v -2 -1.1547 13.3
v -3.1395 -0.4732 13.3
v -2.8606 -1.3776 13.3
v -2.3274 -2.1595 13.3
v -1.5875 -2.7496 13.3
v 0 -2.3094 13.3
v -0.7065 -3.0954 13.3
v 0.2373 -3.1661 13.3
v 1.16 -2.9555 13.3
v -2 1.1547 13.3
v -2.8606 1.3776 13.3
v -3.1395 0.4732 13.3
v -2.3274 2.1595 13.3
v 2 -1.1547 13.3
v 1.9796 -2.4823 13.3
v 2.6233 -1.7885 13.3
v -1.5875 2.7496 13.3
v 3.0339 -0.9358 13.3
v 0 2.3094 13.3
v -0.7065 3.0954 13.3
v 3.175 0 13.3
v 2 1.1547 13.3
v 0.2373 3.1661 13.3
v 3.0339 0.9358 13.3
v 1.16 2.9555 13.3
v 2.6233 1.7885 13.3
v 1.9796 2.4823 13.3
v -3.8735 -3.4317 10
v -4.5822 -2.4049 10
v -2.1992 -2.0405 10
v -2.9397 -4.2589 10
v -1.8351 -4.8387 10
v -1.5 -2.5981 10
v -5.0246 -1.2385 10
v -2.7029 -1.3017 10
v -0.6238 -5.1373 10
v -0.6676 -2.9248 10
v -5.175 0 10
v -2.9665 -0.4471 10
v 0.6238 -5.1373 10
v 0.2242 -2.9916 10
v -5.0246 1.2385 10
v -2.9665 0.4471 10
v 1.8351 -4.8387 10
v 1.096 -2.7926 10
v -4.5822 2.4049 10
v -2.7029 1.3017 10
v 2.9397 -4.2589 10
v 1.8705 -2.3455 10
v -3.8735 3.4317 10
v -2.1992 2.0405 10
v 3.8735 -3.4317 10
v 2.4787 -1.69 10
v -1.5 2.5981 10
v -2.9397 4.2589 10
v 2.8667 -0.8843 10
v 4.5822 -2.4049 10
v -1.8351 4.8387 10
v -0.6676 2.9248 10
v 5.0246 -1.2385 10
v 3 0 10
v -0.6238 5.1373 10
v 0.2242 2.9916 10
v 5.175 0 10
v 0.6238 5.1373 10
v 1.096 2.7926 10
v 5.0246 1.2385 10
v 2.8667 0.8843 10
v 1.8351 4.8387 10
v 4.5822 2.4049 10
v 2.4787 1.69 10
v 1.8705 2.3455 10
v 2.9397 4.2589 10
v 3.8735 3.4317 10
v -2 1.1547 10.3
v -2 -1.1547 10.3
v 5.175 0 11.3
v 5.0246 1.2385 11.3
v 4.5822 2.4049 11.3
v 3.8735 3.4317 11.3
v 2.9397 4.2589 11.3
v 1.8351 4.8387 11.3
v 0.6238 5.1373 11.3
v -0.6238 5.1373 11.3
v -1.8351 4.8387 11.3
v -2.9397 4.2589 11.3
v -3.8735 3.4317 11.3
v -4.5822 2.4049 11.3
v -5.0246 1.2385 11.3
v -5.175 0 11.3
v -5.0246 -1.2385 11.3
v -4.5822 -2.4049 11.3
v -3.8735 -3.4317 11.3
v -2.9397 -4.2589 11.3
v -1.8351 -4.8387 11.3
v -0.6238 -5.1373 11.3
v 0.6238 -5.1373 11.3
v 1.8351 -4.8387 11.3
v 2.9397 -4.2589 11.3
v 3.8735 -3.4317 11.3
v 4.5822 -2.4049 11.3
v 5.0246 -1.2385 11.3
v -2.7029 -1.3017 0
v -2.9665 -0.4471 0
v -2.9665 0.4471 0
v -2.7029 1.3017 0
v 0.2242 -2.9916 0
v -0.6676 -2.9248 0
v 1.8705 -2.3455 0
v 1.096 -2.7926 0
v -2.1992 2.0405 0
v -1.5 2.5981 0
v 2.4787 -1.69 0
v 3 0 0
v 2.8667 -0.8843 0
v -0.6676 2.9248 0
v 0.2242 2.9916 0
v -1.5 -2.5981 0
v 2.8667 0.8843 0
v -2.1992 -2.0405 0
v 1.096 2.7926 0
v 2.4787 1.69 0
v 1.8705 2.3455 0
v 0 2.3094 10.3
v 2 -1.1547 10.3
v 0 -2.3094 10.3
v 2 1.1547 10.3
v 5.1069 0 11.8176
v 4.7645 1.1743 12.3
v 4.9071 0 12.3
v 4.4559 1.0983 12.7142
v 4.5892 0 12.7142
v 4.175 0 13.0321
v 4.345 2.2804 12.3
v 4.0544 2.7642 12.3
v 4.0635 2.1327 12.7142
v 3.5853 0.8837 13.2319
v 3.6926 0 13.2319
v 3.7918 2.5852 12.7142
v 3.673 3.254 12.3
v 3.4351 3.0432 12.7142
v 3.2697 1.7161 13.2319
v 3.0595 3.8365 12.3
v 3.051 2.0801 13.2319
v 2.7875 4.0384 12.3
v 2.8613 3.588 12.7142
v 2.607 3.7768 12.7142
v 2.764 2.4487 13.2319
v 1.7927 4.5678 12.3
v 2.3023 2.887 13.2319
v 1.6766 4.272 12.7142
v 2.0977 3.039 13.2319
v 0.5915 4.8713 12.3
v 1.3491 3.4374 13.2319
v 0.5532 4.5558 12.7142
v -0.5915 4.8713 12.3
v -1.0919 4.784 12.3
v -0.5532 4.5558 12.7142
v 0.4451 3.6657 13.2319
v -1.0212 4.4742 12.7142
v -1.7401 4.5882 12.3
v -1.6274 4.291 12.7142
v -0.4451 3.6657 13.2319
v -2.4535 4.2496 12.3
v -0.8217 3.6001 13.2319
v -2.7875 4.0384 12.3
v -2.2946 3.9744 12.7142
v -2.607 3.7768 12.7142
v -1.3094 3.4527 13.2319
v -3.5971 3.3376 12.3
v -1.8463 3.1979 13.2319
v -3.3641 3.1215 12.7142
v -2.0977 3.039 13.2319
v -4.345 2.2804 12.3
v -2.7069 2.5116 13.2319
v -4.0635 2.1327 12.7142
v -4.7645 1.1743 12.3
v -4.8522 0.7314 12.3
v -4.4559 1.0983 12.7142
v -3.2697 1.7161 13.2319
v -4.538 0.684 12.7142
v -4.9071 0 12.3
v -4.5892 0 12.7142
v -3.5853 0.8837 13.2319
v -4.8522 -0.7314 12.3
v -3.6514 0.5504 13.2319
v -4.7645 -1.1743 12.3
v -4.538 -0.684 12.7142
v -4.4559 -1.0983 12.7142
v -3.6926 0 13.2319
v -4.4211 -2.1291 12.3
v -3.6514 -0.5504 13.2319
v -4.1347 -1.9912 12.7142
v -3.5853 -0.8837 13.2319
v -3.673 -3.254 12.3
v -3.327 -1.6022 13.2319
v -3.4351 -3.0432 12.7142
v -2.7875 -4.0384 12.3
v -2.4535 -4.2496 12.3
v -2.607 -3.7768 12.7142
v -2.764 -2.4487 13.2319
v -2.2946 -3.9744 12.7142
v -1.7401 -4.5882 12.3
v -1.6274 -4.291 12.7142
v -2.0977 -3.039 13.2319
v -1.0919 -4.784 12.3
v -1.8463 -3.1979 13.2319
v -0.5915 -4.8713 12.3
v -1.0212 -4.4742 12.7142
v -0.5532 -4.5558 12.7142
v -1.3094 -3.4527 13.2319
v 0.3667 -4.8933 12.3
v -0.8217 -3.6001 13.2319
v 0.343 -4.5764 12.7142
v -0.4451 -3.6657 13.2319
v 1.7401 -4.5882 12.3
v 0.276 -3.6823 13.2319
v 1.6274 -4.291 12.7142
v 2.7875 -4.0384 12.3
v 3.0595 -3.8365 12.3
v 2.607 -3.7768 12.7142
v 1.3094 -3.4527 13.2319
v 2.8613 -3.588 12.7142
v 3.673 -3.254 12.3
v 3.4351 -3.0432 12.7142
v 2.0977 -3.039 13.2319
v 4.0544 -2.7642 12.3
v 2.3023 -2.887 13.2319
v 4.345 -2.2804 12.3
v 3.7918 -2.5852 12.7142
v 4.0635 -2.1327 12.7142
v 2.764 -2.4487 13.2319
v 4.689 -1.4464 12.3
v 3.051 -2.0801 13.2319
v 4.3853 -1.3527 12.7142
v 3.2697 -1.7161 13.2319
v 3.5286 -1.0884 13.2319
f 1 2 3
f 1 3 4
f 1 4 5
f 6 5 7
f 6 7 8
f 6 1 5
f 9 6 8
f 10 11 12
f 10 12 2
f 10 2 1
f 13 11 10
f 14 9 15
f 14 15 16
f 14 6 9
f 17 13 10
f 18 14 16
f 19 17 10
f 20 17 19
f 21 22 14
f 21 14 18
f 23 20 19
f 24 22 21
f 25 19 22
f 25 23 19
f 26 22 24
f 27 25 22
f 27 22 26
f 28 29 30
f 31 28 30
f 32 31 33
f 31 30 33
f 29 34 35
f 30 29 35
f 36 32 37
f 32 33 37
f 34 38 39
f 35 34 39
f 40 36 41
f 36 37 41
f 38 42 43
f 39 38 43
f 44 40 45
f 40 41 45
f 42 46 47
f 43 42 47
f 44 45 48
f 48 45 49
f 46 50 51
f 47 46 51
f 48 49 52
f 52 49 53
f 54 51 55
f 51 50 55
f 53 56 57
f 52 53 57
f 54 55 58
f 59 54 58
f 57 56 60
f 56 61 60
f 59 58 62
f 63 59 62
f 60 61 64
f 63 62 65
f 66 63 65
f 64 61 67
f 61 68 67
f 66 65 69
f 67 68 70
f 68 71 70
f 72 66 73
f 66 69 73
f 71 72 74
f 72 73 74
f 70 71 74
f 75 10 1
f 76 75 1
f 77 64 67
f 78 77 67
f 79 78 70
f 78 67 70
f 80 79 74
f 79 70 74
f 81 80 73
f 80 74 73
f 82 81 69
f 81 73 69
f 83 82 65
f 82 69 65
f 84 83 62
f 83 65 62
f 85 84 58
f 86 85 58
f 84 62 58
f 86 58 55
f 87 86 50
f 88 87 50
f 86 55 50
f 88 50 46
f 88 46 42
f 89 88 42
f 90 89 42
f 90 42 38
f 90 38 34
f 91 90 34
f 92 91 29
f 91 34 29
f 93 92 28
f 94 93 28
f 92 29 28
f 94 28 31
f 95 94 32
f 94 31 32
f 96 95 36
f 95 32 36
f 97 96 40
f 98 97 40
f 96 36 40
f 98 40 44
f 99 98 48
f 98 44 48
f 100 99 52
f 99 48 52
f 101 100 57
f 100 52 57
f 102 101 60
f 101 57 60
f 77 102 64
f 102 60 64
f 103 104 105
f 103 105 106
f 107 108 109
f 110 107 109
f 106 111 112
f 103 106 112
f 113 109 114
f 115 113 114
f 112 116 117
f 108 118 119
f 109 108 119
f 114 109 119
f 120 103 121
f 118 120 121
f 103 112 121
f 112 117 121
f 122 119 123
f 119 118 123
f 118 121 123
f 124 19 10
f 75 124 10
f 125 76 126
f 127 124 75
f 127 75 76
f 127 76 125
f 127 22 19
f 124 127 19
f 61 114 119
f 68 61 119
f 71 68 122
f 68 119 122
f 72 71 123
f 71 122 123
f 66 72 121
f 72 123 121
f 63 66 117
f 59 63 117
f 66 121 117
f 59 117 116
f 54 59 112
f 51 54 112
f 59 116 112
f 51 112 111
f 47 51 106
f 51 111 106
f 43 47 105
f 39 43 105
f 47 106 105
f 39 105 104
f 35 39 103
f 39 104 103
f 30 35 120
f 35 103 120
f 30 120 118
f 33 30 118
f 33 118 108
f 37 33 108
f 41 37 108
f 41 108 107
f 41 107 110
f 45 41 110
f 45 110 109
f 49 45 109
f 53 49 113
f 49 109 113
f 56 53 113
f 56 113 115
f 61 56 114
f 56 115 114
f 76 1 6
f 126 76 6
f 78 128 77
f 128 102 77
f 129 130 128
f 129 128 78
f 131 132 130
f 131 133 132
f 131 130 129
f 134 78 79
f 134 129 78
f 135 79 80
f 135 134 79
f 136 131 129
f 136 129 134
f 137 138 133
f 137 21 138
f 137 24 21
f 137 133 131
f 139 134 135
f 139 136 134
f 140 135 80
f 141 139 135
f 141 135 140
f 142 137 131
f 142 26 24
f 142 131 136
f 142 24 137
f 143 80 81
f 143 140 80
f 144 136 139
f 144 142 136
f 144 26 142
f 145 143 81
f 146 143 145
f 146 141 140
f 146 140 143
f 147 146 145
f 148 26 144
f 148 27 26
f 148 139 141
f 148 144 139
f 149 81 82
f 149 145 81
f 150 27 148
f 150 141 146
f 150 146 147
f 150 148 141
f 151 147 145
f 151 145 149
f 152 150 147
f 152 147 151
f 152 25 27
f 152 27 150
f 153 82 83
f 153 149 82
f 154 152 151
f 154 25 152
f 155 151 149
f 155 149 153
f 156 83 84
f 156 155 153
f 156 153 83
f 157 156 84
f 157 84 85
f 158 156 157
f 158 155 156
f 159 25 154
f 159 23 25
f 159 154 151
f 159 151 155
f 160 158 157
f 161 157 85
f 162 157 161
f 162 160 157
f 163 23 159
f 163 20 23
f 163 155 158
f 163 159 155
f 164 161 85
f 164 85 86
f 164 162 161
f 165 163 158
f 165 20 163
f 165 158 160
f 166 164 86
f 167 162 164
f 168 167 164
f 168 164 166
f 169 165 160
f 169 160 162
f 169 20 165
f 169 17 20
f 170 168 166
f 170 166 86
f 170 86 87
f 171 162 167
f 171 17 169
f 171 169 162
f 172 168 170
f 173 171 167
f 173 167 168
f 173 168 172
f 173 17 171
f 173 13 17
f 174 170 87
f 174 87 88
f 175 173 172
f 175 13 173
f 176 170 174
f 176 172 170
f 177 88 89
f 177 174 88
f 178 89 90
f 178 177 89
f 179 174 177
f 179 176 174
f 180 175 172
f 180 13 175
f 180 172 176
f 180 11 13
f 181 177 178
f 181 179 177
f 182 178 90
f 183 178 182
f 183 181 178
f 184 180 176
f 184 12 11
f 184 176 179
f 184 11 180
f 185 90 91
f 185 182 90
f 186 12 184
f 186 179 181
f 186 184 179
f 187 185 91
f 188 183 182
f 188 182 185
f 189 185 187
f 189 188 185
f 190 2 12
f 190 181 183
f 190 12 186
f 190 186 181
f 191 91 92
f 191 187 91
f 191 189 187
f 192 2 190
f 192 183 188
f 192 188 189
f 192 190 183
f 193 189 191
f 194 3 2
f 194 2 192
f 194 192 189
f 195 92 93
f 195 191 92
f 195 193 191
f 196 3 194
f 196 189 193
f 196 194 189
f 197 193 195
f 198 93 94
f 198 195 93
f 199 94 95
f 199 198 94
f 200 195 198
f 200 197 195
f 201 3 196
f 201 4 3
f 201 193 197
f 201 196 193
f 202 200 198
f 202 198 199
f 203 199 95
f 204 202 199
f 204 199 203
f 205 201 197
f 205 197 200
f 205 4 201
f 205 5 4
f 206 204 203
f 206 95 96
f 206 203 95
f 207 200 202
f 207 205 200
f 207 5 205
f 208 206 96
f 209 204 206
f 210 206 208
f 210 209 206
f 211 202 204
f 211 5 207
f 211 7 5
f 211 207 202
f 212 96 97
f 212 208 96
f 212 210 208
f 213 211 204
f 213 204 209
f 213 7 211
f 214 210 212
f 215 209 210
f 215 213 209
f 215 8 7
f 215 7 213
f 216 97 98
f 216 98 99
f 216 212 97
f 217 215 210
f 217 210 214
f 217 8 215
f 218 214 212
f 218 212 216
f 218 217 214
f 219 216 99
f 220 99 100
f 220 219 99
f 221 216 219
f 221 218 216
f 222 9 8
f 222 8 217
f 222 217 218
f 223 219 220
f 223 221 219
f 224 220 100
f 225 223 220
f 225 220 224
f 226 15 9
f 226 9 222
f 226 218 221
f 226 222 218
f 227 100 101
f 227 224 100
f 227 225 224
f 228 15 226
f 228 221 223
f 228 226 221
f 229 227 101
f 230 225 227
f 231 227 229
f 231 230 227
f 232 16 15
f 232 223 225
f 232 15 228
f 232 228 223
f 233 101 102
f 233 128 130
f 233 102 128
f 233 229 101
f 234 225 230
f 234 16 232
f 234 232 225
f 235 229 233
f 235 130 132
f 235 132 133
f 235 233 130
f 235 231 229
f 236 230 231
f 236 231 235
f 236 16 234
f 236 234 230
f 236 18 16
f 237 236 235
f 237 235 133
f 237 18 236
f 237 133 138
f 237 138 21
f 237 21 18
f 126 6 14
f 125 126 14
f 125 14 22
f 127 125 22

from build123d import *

# Parameters (mm, degrees)
F0_R     = 3
F1_DEPTH = 10
F2_R     = 5.175
F2_R_2   = 3
F3_DEPTH = 3.3
F4_R     = 2
F6_DEPTH = 3


with BuildPart() as f1:
    # F0 (on Top) → F1 (new body)
    with BuildSketch(Plane.XY):
        Circle(F0_R)
    extrude(amount=F1_DEPTH)

    # F2 (on face) → F3 (join)
    with BuildSketch(Plane.XY.offset(10)):
        Circle(F2_R)
        Circle(F2_R_2, mode=Mode.SUBTRACT)
        Circle(F2_R_2)
    extrude(amount=F3_DEPTH)

    # F4
    f4_edges = [f1.edges().sort_by_distance(p)[0] for p in [
        (-5.175, 0, 13.3),
    ]]
    fillet(f4_edges, radius=F4_R)

    # F5 (on face) → F6 (cut)
    with BuildSketch(Plane.XY.offset(13.3)):
        Polygon((2, -1.1547005384), (2, 1.1547005384), (0, 2.3094010768), (-2, 1.1547005384), (-2, -1.1547005384), (0, -2.3094010768), align=None)
    extrude(amount=-F6_DEPTH, mode=Mode.SUBTRACT)


solid = f1.part
